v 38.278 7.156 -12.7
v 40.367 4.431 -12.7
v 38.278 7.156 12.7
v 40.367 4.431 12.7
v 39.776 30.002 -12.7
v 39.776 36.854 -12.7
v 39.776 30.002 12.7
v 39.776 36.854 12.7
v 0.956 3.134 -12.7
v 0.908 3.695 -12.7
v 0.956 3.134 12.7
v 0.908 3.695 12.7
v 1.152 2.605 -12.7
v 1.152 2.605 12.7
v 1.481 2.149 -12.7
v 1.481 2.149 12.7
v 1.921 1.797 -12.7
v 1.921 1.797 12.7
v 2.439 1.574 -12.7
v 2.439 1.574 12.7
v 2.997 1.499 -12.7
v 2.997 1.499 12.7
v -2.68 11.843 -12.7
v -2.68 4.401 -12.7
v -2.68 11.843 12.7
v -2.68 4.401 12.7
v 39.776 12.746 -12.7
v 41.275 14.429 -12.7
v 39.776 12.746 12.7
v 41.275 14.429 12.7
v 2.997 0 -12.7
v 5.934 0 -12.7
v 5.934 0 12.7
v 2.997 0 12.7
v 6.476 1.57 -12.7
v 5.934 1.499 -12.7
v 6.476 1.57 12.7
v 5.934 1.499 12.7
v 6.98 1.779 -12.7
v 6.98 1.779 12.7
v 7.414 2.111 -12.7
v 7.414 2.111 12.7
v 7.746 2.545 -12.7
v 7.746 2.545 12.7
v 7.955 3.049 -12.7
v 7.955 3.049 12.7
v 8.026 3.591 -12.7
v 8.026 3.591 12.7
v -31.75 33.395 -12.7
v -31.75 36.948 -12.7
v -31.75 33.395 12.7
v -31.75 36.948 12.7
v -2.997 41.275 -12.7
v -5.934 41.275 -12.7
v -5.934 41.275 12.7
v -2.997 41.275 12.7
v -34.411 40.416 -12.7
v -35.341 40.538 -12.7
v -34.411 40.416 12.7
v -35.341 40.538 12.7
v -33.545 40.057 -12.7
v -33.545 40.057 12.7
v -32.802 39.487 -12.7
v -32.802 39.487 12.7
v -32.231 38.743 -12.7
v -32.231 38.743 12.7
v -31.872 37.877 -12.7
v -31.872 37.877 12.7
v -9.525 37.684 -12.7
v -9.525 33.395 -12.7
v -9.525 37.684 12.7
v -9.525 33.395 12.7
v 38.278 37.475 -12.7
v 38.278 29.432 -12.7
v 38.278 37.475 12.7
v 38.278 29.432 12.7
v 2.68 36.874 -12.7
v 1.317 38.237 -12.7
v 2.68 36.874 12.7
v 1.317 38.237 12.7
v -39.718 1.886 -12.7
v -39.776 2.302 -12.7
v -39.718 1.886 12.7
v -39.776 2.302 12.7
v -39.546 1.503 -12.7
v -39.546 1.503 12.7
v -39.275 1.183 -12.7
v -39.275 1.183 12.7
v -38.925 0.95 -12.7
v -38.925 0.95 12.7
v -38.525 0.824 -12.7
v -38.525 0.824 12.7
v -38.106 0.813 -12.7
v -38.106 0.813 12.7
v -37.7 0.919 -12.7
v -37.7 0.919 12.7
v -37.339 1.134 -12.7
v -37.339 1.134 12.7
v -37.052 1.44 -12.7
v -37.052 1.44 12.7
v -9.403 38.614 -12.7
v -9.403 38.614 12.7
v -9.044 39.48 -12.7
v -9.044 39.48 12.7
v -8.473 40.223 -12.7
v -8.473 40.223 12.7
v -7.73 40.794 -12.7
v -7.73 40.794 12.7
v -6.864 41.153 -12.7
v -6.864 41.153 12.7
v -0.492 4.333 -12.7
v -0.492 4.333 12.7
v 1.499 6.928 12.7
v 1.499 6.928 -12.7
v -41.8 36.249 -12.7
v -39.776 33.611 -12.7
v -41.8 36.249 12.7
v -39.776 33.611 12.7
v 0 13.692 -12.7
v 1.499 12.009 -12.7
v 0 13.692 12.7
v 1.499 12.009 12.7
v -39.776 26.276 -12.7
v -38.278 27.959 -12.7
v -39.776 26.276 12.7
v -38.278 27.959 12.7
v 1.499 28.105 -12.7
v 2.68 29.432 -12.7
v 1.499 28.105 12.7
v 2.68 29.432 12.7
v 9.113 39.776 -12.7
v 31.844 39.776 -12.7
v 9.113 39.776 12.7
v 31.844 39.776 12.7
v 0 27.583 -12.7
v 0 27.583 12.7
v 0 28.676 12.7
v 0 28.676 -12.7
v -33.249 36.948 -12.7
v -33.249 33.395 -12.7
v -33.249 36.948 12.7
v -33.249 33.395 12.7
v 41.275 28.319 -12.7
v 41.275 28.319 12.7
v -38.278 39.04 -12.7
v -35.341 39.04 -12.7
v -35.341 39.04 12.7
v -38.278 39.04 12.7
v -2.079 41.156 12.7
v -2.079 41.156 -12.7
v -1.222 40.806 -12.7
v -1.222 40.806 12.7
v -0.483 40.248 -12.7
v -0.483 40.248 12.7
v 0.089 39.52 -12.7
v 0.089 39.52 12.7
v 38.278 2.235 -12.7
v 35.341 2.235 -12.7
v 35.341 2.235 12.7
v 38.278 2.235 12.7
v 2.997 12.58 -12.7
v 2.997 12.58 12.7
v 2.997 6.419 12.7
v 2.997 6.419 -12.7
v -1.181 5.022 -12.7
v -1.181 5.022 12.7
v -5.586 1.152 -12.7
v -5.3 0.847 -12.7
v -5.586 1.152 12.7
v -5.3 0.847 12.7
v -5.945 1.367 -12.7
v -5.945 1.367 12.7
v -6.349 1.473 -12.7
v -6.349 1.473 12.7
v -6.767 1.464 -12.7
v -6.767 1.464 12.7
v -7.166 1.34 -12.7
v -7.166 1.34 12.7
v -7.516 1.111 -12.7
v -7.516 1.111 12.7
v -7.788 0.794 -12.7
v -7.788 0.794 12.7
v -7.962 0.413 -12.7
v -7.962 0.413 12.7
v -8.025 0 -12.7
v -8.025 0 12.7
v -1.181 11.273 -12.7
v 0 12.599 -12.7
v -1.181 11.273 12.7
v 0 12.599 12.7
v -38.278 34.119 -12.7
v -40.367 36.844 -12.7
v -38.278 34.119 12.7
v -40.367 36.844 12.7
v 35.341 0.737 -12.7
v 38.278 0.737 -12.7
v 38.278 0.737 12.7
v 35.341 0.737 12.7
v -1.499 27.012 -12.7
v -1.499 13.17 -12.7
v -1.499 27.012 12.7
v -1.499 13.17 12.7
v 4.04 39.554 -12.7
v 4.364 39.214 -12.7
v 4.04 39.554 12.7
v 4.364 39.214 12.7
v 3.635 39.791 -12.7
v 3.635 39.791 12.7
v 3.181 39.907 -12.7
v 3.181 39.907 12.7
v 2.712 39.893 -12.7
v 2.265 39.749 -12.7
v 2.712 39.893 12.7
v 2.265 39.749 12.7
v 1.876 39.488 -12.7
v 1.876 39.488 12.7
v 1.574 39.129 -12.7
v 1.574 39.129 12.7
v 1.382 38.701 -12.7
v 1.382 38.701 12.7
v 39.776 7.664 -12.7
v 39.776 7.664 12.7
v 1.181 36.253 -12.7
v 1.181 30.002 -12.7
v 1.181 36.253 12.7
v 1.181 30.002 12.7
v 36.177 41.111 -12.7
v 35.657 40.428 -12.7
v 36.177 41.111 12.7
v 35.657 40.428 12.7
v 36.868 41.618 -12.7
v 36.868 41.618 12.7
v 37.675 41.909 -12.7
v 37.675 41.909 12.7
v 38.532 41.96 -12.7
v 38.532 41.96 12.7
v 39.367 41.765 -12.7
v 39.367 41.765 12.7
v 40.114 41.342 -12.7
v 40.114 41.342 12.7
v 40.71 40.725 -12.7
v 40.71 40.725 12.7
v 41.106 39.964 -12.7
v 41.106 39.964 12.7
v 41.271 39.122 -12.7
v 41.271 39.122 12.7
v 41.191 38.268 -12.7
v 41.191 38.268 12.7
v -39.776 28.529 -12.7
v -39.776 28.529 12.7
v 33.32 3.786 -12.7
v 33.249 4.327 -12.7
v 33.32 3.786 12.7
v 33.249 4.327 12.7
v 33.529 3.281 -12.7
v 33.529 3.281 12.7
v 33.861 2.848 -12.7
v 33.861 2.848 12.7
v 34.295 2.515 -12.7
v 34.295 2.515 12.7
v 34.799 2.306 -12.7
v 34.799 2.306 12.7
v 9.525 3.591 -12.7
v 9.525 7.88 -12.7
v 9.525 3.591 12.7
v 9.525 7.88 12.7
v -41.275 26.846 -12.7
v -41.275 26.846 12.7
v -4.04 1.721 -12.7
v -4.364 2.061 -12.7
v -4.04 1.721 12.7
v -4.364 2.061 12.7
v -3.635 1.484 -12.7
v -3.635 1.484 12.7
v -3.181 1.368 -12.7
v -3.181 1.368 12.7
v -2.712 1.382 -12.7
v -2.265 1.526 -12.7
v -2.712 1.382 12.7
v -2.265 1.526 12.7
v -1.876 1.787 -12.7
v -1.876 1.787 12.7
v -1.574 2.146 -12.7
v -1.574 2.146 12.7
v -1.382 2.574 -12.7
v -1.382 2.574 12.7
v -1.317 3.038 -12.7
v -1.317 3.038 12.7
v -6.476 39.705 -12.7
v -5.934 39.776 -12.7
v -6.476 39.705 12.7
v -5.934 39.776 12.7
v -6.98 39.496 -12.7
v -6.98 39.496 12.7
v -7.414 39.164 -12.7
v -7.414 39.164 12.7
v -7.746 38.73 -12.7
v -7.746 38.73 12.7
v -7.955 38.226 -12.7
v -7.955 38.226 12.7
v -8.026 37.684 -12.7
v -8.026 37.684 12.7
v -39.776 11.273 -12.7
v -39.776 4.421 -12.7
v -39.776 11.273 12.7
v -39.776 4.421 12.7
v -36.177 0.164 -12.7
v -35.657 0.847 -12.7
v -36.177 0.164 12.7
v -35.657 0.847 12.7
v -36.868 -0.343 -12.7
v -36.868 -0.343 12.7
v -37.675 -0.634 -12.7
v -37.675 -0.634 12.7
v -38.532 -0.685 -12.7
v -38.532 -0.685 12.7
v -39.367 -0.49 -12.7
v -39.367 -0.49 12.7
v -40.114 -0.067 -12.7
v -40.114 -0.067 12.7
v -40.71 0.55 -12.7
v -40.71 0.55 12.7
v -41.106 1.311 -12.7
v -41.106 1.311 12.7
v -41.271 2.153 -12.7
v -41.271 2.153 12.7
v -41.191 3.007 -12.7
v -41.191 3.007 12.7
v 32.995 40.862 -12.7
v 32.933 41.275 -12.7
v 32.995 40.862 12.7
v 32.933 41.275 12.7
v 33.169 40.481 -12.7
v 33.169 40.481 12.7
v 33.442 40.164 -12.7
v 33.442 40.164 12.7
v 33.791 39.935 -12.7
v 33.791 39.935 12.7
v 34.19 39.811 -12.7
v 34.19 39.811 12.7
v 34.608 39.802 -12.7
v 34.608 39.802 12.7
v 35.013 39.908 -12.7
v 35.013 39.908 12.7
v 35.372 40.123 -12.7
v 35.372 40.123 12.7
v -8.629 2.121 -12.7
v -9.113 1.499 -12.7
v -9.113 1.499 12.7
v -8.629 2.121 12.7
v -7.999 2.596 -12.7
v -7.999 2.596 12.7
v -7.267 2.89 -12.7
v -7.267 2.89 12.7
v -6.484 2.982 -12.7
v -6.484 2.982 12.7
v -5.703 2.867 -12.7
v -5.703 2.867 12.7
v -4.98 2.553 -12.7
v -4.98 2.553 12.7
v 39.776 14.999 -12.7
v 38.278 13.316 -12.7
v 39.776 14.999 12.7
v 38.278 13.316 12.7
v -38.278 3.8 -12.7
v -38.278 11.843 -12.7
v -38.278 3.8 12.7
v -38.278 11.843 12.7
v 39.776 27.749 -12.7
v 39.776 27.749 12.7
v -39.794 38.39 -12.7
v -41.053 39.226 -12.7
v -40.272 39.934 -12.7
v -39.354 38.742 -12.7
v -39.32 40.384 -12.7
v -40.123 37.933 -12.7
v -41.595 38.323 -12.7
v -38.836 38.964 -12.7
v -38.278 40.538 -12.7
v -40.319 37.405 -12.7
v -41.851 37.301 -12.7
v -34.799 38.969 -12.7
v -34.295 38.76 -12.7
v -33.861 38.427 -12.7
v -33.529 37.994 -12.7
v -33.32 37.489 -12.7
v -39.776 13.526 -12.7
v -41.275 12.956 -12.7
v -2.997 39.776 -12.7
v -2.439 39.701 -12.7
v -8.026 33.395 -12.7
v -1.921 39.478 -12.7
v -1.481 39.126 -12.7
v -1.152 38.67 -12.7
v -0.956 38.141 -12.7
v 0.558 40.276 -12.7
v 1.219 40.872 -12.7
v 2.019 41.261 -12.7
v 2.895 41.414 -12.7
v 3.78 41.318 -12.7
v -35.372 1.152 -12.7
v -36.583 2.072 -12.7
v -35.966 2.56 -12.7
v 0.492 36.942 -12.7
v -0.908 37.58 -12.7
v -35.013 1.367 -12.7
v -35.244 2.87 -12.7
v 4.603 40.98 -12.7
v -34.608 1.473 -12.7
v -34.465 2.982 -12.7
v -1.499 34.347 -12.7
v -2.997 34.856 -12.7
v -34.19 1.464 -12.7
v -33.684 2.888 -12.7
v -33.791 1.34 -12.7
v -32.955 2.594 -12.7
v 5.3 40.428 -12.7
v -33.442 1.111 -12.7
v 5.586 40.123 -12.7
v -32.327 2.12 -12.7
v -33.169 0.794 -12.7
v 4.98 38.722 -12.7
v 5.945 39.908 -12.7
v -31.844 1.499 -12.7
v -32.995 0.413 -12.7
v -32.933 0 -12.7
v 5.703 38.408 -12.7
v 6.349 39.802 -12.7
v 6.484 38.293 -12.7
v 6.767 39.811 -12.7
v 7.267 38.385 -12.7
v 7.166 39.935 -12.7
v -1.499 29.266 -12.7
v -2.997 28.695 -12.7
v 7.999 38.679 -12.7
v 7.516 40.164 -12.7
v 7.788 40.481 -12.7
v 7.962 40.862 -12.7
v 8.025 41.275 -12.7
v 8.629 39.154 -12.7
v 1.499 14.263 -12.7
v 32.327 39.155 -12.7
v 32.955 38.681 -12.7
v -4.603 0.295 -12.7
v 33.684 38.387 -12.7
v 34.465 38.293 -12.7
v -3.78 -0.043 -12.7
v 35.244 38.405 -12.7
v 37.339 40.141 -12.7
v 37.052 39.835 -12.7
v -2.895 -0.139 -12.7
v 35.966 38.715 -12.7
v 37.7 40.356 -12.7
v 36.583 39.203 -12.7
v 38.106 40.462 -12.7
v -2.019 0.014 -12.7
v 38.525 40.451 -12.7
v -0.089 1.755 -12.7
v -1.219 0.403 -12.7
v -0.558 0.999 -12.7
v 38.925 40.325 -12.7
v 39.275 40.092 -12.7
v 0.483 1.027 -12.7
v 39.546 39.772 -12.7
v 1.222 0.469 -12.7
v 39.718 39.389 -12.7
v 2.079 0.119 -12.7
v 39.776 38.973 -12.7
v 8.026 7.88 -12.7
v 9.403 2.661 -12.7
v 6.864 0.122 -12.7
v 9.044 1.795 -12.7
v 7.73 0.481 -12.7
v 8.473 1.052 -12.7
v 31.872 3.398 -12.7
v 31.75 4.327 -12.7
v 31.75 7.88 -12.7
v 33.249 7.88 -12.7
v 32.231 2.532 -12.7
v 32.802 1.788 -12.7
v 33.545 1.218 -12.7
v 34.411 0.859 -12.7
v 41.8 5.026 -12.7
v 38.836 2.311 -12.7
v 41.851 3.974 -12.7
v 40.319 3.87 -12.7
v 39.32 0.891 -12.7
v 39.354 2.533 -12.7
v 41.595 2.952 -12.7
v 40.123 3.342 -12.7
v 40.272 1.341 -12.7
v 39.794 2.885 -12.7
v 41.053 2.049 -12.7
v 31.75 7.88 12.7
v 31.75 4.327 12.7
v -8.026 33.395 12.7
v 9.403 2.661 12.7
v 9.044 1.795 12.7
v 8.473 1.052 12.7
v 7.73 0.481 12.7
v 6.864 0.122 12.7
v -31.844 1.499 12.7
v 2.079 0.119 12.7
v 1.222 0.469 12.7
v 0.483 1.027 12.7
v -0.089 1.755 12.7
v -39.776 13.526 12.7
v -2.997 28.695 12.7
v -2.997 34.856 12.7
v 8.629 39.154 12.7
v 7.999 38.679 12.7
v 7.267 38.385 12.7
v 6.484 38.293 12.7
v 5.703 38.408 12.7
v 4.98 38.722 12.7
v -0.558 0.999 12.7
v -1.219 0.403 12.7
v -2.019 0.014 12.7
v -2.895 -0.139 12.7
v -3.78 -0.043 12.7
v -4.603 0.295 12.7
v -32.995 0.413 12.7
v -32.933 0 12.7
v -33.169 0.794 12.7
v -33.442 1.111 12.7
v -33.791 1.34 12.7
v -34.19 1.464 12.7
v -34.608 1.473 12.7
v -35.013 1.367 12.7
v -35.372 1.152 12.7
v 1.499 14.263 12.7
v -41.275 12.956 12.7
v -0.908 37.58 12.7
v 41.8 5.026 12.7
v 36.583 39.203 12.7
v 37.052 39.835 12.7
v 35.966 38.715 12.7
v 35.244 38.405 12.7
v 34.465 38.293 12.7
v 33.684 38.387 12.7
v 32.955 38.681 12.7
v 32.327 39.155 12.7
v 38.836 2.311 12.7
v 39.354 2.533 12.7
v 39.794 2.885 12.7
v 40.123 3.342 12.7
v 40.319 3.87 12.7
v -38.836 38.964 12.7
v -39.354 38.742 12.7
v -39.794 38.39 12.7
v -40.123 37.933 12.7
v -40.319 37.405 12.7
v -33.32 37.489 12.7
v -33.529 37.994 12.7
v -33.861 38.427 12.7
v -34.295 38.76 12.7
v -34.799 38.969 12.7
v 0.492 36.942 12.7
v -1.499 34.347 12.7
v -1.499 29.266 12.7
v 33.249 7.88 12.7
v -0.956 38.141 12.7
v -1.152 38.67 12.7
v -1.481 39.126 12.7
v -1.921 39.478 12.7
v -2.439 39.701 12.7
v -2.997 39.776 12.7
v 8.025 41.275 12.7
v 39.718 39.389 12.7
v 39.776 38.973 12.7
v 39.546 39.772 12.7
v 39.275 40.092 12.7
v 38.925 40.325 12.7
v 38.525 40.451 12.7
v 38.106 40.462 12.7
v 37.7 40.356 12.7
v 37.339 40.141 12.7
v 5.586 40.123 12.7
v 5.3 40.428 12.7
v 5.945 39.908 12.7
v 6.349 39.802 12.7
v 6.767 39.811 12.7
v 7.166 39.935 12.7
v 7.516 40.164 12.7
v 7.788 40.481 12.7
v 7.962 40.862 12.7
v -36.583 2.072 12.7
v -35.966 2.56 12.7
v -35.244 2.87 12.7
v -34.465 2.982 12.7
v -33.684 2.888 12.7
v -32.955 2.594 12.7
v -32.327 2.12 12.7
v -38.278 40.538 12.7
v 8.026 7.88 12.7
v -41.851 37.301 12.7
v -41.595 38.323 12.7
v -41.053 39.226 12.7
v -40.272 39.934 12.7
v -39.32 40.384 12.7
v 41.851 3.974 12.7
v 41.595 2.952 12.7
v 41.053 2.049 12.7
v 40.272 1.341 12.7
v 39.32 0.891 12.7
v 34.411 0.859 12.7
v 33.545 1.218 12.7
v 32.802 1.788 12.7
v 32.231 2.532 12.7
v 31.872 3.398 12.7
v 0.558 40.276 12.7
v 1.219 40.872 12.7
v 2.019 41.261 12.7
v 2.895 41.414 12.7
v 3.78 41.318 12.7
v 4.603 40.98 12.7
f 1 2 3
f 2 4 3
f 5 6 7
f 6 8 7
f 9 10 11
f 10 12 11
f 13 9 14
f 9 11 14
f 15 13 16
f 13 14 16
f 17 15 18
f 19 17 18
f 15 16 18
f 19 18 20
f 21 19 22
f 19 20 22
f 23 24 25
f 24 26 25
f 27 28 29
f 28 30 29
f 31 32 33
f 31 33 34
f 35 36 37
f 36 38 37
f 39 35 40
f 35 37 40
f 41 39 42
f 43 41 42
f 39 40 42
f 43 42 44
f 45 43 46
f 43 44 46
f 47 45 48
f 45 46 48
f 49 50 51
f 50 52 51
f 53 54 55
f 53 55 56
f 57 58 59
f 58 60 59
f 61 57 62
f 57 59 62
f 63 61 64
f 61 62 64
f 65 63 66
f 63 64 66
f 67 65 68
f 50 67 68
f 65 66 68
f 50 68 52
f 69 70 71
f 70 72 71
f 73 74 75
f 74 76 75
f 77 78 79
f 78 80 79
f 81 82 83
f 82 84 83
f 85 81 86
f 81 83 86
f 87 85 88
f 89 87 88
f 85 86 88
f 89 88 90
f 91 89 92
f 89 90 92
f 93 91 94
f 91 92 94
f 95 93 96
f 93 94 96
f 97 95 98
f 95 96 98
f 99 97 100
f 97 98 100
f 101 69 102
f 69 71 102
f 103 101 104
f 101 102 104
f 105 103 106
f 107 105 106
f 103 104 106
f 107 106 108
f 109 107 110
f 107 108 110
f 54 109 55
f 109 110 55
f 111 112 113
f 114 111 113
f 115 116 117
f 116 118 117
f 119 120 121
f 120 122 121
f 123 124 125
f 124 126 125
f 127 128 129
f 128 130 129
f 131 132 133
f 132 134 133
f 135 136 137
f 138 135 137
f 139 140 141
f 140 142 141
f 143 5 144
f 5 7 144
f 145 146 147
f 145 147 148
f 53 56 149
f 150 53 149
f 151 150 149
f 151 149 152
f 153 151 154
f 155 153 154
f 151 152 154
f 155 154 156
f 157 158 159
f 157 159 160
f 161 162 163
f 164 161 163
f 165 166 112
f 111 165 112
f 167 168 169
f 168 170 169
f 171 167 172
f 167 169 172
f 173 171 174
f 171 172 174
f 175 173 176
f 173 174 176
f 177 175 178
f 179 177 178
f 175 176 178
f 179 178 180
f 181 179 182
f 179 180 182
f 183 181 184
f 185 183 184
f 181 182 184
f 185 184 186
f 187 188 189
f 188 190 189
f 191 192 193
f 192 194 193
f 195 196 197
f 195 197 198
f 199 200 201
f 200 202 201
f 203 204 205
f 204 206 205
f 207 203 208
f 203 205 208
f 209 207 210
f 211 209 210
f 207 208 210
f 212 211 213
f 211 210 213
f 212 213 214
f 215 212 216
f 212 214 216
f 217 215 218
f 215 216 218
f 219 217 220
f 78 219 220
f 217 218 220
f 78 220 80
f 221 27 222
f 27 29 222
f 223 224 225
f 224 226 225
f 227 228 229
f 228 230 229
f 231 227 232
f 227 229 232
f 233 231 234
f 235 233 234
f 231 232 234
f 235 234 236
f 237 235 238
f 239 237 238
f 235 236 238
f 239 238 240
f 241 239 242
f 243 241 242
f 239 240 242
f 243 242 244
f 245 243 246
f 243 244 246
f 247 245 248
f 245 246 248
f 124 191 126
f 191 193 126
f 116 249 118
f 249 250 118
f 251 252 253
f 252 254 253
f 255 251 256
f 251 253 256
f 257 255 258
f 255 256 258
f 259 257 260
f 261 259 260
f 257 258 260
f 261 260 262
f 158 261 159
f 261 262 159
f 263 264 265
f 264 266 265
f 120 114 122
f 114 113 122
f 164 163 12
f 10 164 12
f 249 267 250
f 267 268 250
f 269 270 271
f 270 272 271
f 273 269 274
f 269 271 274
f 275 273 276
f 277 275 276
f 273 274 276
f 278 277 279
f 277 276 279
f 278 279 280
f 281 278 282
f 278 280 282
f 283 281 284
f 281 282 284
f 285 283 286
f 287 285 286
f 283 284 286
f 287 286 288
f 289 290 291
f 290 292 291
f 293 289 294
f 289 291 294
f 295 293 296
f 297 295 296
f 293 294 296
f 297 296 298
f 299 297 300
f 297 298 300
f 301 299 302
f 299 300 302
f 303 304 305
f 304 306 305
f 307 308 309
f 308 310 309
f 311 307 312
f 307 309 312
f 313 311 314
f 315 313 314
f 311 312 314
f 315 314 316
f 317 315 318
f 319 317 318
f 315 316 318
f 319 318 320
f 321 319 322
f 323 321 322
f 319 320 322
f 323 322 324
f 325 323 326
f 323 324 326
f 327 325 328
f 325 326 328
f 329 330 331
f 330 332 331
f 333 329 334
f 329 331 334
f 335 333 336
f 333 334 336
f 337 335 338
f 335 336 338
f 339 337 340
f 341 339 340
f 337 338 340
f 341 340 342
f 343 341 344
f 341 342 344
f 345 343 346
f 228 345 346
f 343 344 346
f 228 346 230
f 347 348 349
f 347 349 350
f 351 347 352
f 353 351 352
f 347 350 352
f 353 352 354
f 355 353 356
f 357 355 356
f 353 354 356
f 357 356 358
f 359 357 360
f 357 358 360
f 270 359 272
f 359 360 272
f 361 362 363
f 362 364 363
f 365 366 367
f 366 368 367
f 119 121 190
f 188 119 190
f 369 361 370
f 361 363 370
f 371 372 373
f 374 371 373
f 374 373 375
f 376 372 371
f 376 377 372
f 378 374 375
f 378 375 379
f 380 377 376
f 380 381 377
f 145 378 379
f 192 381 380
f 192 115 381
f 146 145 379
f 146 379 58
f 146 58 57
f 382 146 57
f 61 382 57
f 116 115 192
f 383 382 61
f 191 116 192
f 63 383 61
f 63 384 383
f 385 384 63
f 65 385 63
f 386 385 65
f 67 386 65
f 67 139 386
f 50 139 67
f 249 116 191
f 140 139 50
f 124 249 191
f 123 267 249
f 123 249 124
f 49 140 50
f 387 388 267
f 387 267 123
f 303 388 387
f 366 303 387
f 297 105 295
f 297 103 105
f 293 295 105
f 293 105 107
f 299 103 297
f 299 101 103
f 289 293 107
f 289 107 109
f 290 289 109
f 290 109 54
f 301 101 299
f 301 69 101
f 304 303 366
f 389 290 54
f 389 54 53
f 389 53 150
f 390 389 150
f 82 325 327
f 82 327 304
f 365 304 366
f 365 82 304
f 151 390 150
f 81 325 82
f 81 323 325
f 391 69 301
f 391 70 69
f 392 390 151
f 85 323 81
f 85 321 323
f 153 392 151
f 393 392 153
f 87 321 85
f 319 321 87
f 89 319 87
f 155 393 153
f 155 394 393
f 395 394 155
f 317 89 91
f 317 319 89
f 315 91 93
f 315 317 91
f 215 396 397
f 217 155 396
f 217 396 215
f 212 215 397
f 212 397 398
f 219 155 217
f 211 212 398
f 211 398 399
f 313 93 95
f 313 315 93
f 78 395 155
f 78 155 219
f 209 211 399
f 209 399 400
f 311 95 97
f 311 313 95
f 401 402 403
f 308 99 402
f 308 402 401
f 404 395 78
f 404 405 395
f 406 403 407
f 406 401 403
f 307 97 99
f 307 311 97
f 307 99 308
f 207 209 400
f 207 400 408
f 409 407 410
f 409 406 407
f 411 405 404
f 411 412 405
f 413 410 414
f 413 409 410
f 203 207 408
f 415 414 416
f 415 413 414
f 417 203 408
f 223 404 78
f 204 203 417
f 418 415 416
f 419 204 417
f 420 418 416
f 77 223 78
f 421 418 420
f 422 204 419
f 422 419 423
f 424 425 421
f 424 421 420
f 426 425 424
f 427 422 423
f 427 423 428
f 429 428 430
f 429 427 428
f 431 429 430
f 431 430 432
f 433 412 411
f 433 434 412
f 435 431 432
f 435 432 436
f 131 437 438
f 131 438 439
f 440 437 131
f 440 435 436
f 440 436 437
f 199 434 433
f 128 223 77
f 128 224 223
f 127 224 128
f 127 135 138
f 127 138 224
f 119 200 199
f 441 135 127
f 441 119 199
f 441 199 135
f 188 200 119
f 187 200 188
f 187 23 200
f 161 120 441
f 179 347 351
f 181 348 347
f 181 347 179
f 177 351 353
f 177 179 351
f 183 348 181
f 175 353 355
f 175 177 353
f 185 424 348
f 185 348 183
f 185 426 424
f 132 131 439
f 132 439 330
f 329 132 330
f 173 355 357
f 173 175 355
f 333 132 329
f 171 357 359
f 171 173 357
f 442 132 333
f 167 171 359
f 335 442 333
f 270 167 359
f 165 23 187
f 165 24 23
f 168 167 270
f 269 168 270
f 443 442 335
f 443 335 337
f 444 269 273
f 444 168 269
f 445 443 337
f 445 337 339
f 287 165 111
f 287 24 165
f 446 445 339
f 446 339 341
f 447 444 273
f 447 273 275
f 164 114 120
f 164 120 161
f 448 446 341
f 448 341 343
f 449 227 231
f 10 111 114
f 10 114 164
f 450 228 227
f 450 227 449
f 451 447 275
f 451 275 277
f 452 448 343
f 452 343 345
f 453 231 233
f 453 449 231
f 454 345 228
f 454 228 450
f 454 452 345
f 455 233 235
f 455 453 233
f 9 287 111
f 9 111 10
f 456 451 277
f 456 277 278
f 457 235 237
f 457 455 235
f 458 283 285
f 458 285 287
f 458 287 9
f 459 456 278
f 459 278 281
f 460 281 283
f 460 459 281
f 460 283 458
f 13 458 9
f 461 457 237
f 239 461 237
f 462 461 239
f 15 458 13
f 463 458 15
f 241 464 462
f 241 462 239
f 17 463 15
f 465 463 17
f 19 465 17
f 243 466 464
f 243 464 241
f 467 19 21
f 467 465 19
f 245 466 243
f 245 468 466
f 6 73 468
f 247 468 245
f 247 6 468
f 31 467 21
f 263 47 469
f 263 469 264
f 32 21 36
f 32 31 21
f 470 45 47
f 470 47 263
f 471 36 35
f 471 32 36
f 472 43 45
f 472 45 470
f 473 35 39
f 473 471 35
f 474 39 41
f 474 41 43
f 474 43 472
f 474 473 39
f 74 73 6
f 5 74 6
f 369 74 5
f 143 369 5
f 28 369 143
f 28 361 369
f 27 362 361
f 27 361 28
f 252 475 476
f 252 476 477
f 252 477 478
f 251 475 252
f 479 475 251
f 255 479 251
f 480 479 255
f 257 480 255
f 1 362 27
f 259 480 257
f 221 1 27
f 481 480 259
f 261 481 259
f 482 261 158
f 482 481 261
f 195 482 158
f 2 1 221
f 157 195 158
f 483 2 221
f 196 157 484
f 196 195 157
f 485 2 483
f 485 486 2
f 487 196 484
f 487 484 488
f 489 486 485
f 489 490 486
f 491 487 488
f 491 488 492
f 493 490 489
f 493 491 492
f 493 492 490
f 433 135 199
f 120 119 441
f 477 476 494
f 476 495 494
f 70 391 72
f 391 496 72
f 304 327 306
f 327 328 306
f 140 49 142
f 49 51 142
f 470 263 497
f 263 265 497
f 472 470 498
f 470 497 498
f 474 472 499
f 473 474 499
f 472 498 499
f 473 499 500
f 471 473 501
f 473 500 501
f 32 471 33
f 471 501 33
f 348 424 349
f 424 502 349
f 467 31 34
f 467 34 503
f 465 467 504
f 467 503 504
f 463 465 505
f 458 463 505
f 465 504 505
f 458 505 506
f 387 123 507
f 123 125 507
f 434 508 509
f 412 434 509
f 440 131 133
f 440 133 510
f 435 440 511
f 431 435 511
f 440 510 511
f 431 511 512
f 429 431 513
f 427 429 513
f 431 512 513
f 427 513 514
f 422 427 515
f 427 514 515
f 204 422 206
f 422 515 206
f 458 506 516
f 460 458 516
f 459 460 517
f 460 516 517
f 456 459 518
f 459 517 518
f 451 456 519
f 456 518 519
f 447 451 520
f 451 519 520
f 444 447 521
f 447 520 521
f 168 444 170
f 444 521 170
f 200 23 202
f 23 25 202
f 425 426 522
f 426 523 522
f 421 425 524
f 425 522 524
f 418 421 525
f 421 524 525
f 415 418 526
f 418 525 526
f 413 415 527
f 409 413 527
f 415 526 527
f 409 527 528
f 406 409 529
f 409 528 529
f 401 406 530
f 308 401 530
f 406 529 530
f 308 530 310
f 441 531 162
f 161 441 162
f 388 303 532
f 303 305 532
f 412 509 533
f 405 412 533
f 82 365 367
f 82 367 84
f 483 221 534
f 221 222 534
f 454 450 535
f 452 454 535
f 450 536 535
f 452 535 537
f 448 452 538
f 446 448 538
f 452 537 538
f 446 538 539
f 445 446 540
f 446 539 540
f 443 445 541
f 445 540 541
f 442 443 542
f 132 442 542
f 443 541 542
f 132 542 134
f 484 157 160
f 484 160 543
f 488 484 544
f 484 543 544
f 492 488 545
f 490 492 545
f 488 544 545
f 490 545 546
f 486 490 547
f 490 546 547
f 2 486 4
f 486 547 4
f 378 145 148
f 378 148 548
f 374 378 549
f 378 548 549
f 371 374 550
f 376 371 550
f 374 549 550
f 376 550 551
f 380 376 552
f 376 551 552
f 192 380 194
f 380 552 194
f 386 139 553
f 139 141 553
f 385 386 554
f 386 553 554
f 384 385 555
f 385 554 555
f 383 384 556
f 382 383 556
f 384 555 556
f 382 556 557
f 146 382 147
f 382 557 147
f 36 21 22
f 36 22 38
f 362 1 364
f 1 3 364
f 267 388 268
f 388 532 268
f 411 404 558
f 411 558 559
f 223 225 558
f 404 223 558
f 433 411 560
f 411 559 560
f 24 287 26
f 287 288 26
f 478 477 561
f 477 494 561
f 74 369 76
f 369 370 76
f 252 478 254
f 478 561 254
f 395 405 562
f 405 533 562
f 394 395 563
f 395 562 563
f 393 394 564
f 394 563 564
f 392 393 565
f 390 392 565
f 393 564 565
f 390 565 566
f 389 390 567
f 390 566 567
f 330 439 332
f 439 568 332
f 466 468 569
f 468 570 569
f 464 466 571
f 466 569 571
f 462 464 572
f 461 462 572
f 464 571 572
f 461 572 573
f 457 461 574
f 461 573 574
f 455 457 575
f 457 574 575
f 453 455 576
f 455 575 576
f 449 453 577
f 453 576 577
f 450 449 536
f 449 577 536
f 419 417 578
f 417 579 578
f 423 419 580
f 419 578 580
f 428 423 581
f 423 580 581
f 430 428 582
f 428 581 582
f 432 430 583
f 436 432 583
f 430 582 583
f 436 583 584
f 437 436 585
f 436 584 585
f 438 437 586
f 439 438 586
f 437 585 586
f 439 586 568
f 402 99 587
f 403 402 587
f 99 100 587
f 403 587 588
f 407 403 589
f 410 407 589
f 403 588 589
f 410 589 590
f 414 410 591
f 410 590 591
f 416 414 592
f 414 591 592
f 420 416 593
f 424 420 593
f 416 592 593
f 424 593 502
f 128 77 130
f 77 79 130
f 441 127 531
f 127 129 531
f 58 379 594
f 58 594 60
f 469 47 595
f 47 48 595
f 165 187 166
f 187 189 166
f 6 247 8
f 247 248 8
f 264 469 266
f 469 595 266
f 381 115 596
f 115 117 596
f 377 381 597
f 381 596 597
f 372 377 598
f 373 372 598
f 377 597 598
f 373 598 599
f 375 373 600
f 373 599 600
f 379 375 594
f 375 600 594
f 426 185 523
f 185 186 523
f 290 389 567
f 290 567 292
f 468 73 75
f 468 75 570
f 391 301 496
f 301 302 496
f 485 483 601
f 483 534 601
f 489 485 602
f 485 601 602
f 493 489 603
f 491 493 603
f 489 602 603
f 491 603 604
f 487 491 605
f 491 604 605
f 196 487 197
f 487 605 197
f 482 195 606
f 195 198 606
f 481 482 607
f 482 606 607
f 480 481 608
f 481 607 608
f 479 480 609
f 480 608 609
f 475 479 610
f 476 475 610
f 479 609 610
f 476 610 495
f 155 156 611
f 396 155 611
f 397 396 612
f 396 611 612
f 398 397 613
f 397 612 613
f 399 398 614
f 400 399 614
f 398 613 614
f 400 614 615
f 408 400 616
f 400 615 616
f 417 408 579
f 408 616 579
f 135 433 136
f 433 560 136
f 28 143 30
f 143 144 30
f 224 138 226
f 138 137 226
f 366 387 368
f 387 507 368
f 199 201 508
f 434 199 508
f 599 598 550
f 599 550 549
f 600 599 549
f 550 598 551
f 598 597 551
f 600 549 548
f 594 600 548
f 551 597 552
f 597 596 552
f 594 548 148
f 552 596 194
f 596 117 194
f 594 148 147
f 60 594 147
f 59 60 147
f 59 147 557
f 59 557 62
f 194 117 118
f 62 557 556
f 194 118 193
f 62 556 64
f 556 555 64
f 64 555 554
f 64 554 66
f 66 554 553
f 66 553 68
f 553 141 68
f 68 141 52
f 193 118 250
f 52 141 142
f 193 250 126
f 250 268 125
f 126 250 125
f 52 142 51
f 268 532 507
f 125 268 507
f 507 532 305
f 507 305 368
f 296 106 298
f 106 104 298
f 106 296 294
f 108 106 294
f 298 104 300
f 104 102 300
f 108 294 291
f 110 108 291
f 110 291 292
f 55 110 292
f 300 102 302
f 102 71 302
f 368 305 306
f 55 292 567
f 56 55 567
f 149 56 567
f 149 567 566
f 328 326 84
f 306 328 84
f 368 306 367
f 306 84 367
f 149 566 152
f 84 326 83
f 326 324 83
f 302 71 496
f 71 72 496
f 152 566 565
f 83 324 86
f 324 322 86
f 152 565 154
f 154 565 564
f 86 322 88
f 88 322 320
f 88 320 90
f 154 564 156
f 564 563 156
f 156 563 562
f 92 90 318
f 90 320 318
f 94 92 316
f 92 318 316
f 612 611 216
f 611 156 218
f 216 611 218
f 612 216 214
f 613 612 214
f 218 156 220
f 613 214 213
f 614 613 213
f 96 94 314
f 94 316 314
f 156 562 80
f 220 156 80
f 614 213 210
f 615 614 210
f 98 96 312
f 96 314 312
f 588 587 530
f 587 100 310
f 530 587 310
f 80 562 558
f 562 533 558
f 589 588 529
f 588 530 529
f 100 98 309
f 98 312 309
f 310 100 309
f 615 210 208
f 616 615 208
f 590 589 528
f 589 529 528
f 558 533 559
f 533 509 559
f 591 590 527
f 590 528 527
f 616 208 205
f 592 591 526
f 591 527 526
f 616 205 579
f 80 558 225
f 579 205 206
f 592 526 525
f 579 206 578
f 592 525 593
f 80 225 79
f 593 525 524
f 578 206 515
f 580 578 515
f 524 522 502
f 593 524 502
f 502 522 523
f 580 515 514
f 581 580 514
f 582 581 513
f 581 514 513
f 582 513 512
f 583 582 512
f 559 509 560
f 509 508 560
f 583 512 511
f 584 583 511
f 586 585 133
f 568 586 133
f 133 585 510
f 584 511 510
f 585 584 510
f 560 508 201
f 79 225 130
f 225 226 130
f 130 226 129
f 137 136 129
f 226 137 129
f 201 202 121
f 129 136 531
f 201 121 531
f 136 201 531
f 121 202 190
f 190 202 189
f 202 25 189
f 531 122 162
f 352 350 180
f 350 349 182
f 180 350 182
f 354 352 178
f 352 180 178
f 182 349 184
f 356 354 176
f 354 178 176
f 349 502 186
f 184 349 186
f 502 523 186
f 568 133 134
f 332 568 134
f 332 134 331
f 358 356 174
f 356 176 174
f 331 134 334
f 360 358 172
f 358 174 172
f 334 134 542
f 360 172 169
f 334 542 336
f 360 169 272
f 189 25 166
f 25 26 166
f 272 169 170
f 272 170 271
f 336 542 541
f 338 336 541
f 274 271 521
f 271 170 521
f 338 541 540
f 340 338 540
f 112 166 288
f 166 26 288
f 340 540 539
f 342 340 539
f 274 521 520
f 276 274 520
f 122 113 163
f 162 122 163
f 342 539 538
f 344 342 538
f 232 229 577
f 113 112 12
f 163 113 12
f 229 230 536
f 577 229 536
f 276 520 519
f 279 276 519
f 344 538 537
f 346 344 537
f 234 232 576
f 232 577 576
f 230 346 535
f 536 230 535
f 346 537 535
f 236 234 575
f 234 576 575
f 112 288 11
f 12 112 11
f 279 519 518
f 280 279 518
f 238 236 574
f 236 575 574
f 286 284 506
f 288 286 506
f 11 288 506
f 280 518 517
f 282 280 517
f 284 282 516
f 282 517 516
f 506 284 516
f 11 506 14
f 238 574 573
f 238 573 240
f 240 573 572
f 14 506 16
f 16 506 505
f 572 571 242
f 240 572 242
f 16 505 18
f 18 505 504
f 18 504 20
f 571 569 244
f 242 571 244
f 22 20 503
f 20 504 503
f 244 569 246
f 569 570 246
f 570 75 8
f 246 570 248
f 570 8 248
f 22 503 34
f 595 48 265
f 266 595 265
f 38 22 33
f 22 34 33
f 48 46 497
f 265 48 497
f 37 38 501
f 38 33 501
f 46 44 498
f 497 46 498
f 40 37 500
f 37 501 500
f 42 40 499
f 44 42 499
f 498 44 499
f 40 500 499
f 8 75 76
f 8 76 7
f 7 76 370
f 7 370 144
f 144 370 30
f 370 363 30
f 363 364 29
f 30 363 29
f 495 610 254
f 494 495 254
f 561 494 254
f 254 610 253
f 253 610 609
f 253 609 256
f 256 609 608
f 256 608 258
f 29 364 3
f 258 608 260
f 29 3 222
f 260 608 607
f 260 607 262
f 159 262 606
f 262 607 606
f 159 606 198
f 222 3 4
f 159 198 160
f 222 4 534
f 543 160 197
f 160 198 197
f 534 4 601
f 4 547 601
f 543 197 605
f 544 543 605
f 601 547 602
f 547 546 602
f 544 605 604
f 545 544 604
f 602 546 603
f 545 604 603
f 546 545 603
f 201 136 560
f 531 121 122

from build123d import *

# Parameters (mm, degrees)
BASE_EXTRUDE_DEPTH = 12.7
CIRPATTERN1_COUNT  = 2


with BuildPart() as part:
    # Sketch1 → Base-Extrude (new, symmetric)
    with BuildSketch(Plane(origin=(-20.32, 17.78, 0), x_dir=(1, 0, 0), z_dir=(0, 0, 1))):
        with BuildLine():
            Line((17.3228, 17.075886512), (19.412382578, 19.800133504))
            ThreePointArc((19.412382578, 19.800133504), (18.838545845, 21.346344632), (17.3228, 21.9964))
            Line((17.3228, 21.9964), (14.38577367, 21.9964))
            ThreePointArc((14.38577367, 21.9964), (12.906383481, 21.383616519), (12.2936, 19.90422633))
            Line((12.2936, 19.90422633), (12.2936, 15.61465))
            Line((12.2936, 15.61465), (10.795, 15.61465))
            Line((10.795, 15.61465), (10.795, 19.90422633))
            ThreePointArc((10.795, 19.90422633), (11.846713258, 22.443286742), (14.38577367, 23.495))
            Line((14.38577367, 23.495), (17.3228, 23.495))
            ThreePointArc((17.3228, 23.495), (20.097934554, 22.182884653), (20.844928673, 19.2054666))
            Line((20.844928673, 19.2054666), (18.8214, 16.567335923))
            Line((18.8214, 16.567335923), (18.8214, 11.485729415))
            Line((18.8214, 11.485729415), (20.32, 9.8028125))
            Line((20.32, 9.8028125), (20.32, -5.180962694))
            Line((20.32, -5.180962694), (19.1389, -6.507329415))
            Line((19.1389, -6.507329415), (19.1389, -12.757931546))
            Line((19.1389, -12.757931546), (20.424084837, -14.043116383))
            ThreePointArc((20.424084837, -14.043116383), (18.821804006, -17.54486751), (15.019825564, -16.932883251))
            ThreePointArc((15.019825564, -16.932883251), (13.348875824, -16.363652979), (12.29528328, -17.78))
            Line((12.29528328, -17.78), (-12.61278328, -17.78))
            ThreePointArc((-12.61278328, -17.78), (-13.666375824, -16.363652979), (-15.337325564, -16.932883251))
            ThreePointArc((-15.337325564, -16.932883251), (-19.047442105, -18.270236732), (-20.870958003, -14.773342558))
            Line((-20.870958003, -14.773342558), (-19.4564, -13.358784555))
            Line((-19.4564, -13.358784555), (-19.4564, -6.507329415))
            Line((-19.4564, -6.507329415), (-20.955, -4.8244125))
            Line((-20.955, -4.8244125), (-20.955, 9.0662125))
            Line((-20.955, 9.0662125), (-19.4564, 10.749129415))
            Line((-19.4564, 10.749129415), (-19.4564, 15.830735923))
            Line((-19.4564, 15.830735923), (-21.479928673, 18.4688666))
            ThreePointArc((-21.479928673, 18.4688666), (-20.732934554, 21.446284653), (-17.9578, 22.7584))
            Line((-17.9578, 22.7584), (-15.02077367, 22.7584))
            ThreePointArc((-15.02077367, 22.7584), (-12.481713258, 21.706686742), (-11.43, 19.16762633))
            Line((-11.43, 19.16762633), (-11.43, 15.61465))
            Line((-11.43, 15.61465), (-12.9286, 15.61465))
            Line((-12.9286, 15.61465), (-12.9286, 19.16762633))
            ThreePointArc((-12.9286, 19.16762633), (-13.541383481, 20.647016519), (-15.02077367, 21.2598))
            Line((-15.02077367, 21.2598), (-17.9578, 21.2598))
            ThreePointArc((-17.9578, 21.2598), (-19.473545845, 20.609744632), (-20.047382578, 19.063533504))
            Line((-20.047382578, 19.063533504), (-17.9578, 16.339286512))
            Line((-17.9578, 16.339286512), (-17.9578, 10.17860201))
            Line((-17.9578, 10.17860201), (-19.4564, 8.495685095))
            Line((-19.4564, 8.495685095), (-19.4564, -4.253885095))
            Line((-19.4564, -4.253885095), (-17.9578, -5.93680201))
            Line((-17.9578, -5.93680201), (-17.9578, -13.979525))
            Line((-17.9578, -13.979525), (-19.4564, -15.478125))
            ThreePointArc((-19.4564, -15.478125), (-18.409738669, -16.906954381), (-16.731785827, -16.33992034))
            ThreePointArc((-16.731785827, -16.33992034), (-14.14499029, -14.797667818), (-11.524190259, -16.2814))
            Line((-11.524190259, -16.2814), (11.206690259, -16.2814))
            ThreePointArc((11.206690259, -16.2814), (13.441553644, -14.818250812), (15.956217628, -15.719297395))
            ThreePointArc((15.956217628, -15.719297395), (17.836242029, -16.3415136), (19.00315301, -14.741525))
            Line((19.00315301, -14.741525), (17.6403, -13.37867199))
            Line((17.6403, -13.37867199), (17.6403, -5.93680201))
            Line((17.6403, -5.93680201), (18.8214, -4.610435289))
            Line((18.8214, -4.610435289), (18.8214, 9.232285095))
            Line((18.8214, 9.232285095), (17.3228, 10.91520201))
            Line((17.3228, 10.91520201), (17.3228, 17.075886512))
        make_face()
    base_extrude = extrude(amount=BASE_EXTRUDE_DEPTH, both=True)

    # CirPattern1: Base-Extrude ×2 about axis
    cirpattern1_axis = Axis((0, 20.6375, 0), (0, 0, 1))
    for i in range(1, CIRPATTERN1_COUNT):
        add(base_extrude.rotate(cirpattern1_axis, i * 360 / CIRPATTERN1_COUNT))


solid = part.part
